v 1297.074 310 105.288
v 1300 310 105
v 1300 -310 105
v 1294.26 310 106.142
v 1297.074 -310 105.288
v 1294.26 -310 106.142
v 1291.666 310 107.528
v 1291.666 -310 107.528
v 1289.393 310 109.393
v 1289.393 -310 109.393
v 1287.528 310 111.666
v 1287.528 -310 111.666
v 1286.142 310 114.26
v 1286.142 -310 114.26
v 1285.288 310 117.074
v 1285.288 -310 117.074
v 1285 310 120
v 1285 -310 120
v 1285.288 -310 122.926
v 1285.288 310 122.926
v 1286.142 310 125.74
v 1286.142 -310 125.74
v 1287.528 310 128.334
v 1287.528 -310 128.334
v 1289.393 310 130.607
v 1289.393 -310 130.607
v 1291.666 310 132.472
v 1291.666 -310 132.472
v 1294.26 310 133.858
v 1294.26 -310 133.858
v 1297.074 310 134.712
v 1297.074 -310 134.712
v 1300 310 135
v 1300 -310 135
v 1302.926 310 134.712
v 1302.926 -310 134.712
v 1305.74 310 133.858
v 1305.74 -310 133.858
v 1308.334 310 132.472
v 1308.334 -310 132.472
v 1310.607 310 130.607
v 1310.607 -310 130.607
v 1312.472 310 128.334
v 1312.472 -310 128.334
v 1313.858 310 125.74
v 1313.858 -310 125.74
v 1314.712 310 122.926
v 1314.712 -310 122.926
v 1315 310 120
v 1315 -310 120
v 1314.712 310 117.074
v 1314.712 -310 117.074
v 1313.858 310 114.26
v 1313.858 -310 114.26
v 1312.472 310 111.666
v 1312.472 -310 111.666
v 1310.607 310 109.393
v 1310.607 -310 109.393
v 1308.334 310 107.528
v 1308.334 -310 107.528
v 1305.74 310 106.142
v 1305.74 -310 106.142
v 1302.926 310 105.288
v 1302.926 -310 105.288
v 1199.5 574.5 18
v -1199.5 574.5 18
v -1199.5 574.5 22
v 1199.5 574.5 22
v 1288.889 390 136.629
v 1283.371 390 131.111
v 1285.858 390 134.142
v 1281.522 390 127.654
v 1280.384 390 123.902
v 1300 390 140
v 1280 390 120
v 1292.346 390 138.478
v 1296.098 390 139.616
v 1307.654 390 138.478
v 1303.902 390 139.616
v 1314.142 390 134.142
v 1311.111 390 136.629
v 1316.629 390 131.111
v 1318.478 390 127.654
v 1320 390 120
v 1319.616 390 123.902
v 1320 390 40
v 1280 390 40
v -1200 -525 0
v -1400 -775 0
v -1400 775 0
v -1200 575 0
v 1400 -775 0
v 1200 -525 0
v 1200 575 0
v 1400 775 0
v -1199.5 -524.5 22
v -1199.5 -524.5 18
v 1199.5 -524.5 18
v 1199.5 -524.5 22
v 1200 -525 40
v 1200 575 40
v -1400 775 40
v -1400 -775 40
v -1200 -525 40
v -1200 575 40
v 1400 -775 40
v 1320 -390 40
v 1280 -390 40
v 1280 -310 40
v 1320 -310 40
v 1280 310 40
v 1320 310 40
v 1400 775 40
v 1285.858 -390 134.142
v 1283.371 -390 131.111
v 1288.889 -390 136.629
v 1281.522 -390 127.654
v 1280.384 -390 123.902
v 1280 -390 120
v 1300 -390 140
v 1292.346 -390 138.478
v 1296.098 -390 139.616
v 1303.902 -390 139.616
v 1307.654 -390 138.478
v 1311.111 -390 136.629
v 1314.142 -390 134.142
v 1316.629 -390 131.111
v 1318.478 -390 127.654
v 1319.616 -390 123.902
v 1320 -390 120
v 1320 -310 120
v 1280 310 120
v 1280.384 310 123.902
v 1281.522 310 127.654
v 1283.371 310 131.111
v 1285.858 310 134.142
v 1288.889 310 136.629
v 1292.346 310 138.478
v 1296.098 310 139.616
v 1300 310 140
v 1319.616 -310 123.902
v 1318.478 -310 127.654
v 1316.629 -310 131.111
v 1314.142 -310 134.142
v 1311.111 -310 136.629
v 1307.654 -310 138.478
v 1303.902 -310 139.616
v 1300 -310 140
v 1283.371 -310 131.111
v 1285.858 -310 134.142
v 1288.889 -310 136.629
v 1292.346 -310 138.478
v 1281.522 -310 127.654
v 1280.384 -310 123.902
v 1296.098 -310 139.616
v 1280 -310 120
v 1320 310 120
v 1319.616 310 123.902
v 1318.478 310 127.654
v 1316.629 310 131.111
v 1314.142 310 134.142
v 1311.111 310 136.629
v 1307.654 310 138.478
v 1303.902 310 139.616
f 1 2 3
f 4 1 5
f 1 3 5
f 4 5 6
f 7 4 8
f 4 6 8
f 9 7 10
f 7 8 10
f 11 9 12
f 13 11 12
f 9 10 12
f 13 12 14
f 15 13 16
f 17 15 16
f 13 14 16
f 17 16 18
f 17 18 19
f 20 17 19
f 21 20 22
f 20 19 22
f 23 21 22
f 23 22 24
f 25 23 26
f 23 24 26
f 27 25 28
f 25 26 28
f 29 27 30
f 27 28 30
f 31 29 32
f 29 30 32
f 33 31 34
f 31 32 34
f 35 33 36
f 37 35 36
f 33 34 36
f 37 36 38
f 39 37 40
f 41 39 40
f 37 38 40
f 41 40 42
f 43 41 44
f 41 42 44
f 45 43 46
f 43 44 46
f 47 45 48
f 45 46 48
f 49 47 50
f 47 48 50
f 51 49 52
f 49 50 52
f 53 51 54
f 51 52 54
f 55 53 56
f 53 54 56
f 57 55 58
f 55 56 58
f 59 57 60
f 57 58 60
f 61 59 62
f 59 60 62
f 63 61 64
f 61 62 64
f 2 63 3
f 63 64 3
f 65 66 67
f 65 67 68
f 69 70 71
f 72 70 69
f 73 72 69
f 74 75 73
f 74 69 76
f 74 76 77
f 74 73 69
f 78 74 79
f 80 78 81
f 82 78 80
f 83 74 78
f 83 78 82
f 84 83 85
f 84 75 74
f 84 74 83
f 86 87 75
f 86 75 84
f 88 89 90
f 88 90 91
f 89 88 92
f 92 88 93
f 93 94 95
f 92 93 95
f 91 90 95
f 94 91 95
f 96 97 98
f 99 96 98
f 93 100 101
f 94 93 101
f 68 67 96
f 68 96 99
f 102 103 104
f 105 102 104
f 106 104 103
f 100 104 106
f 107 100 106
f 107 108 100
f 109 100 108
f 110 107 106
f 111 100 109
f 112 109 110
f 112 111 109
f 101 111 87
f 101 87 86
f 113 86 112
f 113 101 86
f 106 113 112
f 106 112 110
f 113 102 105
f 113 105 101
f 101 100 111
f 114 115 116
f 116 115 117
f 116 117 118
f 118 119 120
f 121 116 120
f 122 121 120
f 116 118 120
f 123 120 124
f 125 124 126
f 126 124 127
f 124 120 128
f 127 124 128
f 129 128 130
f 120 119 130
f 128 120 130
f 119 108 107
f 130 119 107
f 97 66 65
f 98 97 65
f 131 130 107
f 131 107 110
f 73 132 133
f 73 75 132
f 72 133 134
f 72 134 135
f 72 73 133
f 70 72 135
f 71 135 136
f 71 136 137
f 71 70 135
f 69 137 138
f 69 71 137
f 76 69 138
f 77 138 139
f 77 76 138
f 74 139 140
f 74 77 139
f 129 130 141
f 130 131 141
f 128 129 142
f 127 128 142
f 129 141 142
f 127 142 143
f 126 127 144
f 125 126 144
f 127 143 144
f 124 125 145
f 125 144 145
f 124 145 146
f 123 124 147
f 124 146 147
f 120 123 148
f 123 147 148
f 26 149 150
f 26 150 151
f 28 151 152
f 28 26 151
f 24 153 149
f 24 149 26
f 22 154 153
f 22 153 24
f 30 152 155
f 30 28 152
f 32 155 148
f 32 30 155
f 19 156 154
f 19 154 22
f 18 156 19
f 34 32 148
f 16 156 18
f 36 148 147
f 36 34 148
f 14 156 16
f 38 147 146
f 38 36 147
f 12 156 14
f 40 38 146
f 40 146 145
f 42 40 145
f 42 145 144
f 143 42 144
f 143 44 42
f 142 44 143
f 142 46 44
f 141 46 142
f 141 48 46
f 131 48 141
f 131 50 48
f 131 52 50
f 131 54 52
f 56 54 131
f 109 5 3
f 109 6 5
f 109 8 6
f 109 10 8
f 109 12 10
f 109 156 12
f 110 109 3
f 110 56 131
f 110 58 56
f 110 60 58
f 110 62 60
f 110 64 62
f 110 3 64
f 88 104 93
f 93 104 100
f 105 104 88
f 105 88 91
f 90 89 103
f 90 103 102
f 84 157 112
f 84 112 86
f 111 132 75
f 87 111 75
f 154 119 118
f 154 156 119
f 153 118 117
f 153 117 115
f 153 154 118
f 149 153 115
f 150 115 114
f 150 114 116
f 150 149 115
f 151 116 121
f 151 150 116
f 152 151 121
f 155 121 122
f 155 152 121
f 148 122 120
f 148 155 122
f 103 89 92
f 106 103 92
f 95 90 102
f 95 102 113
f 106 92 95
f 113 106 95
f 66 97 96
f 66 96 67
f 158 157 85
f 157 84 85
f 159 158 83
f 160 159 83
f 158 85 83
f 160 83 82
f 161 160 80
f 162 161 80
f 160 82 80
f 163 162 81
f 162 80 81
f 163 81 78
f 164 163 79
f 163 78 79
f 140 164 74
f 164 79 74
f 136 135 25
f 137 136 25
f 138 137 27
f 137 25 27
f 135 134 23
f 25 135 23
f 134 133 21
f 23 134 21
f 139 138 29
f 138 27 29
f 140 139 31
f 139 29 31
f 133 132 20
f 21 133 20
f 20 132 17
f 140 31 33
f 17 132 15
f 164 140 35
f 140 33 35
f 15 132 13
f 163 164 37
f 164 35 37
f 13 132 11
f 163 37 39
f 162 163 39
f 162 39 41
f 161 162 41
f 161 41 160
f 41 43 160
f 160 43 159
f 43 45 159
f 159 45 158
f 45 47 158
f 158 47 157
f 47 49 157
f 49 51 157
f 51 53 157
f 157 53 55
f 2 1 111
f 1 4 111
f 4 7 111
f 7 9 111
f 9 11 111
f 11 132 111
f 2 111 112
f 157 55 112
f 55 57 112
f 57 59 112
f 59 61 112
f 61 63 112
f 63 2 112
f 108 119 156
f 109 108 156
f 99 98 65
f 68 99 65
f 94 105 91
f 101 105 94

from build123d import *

# Parameters (mm, degrees)
SKETCH1_W                = 2800
SKETCH1_H                = 1550
BOSS_EXTRUDE1_DEPTH      = 40
SKETCH3_W                = 40
SKETCH3_H                = 80
BOSS_EXTRUDE4_DEPTH      = 100
FILLET1_R                = 20
LPATTERN1_COUNT          = 2
LPATTERN1_PITCH          = 700
FILLET1_OF_LPATTERN1_R   = 20
SKETCH4_R                = 15
BOSS_EXTRUDE5_DEPTH      = 620
SKETCH5_W                = 2400
SKETCH5_H                = 1100
CUT_EXTRUDE1_DEPTH       = 652
BOSS_EXTRUDE6_DEPTH      = 2
BOSS_EXTRUDE6_DEPTH_BACK = 2
SKETCH6_W                = 2399
SKETCH6_H                = 1099


with BuildPart() as part:
    # Sketch1 → Boss-Extrude1 (new body)
    with BuildSketch(Plane.XY):
        Rectangle(SKETCH1_W, SKETCH1_H)
    extrude(amount=BOSS_EXTRUDE1_DEPTH)

    # Sketch3 → Boss-Extrude4 (add)
    with BuildSketch(Plane.XY.offset(40)):
        with Locations((1300, 350)):
            Rectangle(SKETCH3_W, SKETCH3_H)
    boss_extrude4 = extrude(amount=BOSS_EXTRUDE4_DEPTH)

    # Fillet1
    fillet1_edges = [part.edges().sort_by_distance(p)[0] for p in [
        (1280, 350, 140),
        (1320, 350, 140),
    ]]
    fillet(fillet1_edges, radius=FILLET1_R - 0.0001)  # a hair under: the kernel refuses the full size

    # LPattern1: Boss-Extrude4 ×2
    with Locations(*[(0, -i * LPATTERN1_PITCH, 0) for i in range(1, LPATTERN1_COUNT)]):
        add(boss_extrude4)

    # Fillet1 of LPattern1
    fillet1_of_lpattern1_edges = [part.edges().sort_by_distance(p)[0] for p in [
        (1280, -350, 140),
        (1320, -350, 140),
    ]]
    fillet(fillet1_of_lpattern1_edges, radius=FILLET1_OF_LPATTERN1_R - 0.0001)  # a hair under: the kernel refuses the full size

    # Sketch4 → Boss-Extrude5 (add)
    with BuildSketch(Plane(origin=(0, -310, 0), x_dir=(1, 0, 0), z_dir=(0, 1, 0))):
        with Locations(Location((1300, -120, 0), (0, 0, 90))):
            Circle(SKETCH4_R)
    extrude(amount=BOSS_EXTRUDE5_DEPTH)

    # Sketch5 → Cut-Extrude1 (cut)
    with BuildSketch(Plane.XY.offset(40)):
        with Locations((0, 25)):
            Rectangle(SKETCH5_W, SKETCH5_H)
    extrude(amount=-CUT_EXTRUDE1_DEPTH, mode=Mode.SUBTRACT)


with BuildPart() as body_2:
    # Sketch6 → Boss-Extrude6 (new, two sides: drawn at the far end of the back side and taken through both)
    with BuildSketch(Plane.XY.offset(20).offset(-BOSS_EXTRUDE6_DEPTH_BACK)):
        with Locations((0, 25)):
            Rectangle(SKETCH6_W, SKETCH6_H)
    extrude(amount=BOSS_EXTRUDE6_DEPTH + BOSS_EXTRUDE6_DEPTH_BACK)


solid = Compound([part.part, body_2.part])
